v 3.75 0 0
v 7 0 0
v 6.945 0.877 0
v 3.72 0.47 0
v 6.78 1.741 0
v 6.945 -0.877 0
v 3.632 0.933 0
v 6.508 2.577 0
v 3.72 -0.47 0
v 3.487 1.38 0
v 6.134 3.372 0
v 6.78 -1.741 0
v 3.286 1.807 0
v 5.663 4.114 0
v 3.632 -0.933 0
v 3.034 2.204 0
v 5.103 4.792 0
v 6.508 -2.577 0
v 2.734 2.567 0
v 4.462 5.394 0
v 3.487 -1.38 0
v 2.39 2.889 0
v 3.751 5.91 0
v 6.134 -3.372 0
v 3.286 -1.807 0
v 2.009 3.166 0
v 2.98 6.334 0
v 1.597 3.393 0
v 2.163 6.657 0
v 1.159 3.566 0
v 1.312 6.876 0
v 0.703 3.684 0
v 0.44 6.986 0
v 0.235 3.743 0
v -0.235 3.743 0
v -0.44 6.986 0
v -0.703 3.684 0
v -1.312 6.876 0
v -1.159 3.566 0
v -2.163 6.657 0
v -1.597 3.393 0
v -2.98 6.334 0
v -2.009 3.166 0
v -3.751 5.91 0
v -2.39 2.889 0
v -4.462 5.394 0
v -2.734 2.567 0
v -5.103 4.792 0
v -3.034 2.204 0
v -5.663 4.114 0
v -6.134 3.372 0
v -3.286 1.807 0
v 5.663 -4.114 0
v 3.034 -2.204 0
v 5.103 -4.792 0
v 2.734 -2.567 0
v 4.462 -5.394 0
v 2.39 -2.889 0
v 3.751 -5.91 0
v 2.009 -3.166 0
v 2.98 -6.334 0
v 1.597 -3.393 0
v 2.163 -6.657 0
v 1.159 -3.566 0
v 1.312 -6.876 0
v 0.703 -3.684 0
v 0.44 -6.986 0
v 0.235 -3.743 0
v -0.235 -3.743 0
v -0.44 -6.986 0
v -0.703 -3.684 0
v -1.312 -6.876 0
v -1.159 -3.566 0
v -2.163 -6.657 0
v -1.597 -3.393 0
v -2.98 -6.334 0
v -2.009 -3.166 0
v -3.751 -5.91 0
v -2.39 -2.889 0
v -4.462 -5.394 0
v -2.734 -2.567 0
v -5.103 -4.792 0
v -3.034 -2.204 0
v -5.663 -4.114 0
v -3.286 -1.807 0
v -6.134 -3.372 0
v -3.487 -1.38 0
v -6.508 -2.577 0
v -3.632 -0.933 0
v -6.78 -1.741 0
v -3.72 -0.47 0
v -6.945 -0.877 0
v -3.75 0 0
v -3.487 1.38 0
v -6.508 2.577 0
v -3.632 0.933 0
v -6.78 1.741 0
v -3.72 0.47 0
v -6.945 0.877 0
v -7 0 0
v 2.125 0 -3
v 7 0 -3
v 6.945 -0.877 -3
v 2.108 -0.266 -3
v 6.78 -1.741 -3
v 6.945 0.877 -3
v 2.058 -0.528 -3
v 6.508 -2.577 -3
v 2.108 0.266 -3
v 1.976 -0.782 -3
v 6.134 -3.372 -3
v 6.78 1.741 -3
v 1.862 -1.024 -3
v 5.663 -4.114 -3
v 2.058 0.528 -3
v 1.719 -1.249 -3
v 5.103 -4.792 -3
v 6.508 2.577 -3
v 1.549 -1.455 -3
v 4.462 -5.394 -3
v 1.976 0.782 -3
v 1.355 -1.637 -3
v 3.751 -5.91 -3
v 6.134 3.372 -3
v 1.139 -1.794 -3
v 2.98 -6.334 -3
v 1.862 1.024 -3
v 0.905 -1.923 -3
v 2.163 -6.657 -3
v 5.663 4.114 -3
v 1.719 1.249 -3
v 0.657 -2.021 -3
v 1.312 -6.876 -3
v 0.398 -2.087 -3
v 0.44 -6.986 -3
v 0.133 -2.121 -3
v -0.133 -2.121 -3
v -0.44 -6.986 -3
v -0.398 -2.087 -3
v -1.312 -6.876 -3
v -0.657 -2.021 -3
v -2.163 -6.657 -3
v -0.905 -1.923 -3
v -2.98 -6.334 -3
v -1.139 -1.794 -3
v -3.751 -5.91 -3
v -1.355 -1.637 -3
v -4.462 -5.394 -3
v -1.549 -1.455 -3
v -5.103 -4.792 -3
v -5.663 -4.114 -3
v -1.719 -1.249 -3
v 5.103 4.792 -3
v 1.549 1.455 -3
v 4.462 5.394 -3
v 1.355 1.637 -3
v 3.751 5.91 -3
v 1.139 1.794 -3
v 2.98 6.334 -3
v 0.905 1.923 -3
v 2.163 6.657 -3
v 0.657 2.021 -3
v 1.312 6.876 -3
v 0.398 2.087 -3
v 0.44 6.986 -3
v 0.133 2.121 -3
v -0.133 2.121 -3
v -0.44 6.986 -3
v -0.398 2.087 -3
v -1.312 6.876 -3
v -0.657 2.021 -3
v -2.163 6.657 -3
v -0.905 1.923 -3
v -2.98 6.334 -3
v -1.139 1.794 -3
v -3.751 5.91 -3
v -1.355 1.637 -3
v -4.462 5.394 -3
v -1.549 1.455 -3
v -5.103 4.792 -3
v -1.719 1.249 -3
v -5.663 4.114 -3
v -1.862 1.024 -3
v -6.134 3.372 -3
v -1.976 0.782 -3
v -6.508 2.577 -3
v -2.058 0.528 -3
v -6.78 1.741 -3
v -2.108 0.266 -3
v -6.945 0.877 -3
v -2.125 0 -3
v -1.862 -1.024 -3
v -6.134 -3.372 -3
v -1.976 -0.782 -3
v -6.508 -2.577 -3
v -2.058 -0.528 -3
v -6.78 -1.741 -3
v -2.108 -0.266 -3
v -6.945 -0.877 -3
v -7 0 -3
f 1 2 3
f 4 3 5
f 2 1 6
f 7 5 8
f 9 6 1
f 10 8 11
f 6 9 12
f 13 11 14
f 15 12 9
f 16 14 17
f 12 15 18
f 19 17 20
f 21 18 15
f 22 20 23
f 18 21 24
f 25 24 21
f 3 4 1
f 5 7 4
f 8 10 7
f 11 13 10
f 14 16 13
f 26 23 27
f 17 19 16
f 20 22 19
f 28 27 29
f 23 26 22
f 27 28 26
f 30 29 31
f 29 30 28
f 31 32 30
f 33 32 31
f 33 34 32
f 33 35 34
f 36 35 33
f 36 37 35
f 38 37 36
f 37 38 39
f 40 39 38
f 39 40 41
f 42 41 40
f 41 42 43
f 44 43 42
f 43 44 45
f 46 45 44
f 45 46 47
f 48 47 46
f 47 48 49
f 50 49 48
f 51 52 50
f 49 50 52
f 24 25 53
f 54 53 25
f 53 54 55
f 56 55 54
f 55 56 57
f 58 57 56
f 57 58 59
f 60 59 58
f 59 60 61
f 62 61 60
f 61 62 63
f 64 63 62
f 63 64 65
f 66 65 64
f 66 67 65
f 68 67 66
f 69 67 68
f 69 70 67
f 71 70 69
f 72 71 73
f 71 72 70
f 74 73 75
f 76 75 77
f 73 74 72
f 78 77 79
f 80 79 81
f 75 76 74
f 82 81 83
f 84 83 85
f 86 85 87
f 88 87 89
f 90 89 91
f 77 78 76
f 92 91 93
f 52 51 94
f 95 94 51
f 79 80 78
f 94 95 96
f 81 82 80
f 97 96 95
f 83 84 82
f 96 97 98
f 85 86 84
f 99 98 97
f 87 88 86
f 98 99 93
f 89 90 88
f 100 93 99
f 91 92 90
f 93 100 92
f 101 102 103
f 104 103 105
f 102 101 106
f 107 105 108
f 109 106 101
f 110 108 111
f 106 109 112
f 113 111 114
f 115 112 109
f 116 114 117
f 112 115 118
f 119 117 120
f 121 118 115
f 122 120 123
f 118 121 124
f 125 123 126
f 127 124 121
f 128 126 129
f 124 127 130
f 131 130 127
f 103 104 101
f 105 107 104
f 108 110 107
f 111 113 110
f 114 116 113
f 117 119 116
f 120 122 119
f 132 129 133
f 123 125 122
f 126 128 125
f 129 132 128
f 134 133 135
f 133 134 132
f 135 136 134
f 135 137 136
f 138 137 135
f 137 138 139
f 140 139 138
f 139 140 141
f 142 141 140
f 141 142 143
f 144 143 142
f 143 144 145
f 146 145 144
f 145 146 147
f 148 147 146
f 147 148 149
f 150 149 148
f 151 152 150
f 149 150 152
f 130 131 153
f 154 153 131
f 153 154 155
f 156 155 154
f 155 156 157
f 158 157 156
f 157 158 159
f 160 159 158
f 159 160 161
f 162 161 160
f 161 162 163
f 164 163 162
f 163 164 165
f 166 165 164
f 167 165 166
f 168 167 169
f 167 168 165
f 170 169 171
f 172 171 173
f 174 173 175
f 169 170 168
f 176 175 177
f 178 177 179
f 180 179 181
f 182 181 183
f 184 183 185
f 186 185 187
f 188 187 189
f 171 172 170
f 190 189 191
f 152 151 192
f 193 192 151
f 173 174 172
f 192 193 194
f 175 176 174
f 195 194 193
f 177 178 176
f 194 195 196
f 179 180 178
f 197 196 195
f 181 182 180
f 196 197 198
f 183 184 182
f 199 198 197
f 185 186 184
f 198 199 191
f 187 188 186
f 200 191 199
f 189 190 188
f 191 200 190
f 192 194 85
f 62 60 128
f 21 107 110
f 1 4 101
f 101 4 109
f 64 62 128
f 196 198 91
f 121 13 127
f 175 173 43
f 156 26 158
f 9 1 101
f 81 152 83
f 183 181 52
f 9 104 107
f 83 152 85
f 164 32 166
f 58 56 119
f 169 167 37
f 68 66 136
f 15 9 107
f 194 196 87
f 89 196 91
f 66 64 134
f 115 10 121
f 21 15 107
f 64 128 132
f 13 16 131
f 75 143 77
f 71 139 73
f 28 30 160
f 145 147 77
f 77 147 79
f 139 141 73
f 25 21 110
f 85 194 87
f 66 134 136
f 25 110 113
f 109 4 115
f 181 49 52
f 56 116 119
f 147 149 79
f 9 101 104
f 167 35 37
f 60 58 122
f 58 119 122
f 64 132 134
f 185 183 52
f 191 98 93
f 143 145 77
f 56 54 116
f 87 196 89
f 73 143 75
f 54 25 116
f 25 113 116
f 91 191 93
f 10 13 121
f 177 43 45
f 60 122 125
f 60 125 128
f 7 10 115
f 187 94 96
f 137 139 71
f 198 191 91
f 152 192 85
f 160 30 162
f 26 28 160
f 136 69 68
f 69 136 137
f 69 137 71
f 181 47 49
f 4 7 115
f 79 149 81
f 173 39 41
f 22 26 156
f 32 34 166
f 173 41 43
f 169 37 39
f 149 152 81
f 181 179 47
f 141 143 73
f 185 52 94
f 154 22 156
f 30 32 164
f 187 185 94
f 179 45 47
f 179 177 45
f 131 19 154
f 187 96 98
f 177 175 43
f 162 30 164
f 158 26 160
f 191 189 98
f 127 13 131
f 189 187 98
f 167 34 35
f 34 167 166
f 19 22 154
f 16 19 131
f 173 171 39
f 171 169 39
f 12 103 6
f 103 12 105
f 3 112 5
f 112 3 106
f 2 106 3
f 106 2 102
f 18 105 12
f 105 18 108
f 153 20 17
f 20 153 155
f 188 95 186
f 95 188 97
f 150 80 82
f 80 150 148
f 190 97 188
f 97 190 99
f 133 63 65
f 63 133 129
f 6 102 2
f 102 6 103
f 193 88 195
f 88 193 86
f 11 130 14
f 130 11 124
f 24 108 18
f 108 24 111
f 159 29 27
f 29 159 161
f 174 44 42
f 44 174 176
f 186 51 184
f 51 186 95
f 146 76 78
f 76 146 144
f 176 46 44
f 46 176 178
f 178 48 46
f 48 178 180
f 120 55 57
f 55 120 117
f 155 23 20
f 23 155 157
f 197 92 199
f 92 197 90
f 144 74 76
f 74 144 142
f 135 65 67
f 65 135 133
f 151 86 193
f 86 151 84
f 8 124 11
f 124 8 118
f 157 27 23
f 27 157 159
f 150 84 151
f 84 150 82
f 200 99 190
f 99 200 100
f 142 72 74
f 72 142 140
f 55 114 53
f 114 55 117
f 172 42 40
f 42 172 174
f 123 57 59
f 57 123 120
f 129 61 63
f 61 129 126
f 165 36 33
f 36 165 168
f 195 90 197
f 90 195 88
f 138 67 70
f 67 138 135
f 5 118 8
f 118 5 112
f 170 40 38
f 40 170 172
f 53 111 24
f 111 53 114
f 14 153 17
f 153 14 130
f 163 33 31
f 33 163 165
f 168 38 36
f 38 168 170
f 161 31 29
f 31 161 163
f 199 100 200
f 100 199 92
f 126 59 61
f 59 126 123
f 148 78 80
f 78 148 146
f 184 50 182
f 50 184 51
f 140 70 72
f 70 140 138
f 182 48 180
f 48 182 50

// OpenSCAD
$fn = 50;


difference() {
	union() {
		translate(v = [0, 0, -3.0000000000]) {
			cylinder(h = 3, r = 7.0000000000);
		}
		cylinder(h = 0, r = 16.0000000000);
	}
	union() {
		translate(v = [0, 0, 0]) {
			rotate(a = [0, 0, 0]) {
				difference() {
					union() {
						#translate(v = [0, 0, -3.0000000000]) {
							cylinder(h = 3, r = 2.0000000000);
						}
						#translate(v = [0, 0, -3]) {
							cylinder(h = 3, r = 7.0000000000, r1 = 2.1250000000, r2 = 3.7500000000);
						}
						#translate(v = [0, 0, -3.0000000000]) {
							cylinder(h = 3, r = 2.1250000000);
						}
						#translate(v = [0, 0, -3.0000000000]) {
							cylinder(h = 3, r = 2.0000000000);
						}
					}
					union();
				}
			}
		}
	}
}
